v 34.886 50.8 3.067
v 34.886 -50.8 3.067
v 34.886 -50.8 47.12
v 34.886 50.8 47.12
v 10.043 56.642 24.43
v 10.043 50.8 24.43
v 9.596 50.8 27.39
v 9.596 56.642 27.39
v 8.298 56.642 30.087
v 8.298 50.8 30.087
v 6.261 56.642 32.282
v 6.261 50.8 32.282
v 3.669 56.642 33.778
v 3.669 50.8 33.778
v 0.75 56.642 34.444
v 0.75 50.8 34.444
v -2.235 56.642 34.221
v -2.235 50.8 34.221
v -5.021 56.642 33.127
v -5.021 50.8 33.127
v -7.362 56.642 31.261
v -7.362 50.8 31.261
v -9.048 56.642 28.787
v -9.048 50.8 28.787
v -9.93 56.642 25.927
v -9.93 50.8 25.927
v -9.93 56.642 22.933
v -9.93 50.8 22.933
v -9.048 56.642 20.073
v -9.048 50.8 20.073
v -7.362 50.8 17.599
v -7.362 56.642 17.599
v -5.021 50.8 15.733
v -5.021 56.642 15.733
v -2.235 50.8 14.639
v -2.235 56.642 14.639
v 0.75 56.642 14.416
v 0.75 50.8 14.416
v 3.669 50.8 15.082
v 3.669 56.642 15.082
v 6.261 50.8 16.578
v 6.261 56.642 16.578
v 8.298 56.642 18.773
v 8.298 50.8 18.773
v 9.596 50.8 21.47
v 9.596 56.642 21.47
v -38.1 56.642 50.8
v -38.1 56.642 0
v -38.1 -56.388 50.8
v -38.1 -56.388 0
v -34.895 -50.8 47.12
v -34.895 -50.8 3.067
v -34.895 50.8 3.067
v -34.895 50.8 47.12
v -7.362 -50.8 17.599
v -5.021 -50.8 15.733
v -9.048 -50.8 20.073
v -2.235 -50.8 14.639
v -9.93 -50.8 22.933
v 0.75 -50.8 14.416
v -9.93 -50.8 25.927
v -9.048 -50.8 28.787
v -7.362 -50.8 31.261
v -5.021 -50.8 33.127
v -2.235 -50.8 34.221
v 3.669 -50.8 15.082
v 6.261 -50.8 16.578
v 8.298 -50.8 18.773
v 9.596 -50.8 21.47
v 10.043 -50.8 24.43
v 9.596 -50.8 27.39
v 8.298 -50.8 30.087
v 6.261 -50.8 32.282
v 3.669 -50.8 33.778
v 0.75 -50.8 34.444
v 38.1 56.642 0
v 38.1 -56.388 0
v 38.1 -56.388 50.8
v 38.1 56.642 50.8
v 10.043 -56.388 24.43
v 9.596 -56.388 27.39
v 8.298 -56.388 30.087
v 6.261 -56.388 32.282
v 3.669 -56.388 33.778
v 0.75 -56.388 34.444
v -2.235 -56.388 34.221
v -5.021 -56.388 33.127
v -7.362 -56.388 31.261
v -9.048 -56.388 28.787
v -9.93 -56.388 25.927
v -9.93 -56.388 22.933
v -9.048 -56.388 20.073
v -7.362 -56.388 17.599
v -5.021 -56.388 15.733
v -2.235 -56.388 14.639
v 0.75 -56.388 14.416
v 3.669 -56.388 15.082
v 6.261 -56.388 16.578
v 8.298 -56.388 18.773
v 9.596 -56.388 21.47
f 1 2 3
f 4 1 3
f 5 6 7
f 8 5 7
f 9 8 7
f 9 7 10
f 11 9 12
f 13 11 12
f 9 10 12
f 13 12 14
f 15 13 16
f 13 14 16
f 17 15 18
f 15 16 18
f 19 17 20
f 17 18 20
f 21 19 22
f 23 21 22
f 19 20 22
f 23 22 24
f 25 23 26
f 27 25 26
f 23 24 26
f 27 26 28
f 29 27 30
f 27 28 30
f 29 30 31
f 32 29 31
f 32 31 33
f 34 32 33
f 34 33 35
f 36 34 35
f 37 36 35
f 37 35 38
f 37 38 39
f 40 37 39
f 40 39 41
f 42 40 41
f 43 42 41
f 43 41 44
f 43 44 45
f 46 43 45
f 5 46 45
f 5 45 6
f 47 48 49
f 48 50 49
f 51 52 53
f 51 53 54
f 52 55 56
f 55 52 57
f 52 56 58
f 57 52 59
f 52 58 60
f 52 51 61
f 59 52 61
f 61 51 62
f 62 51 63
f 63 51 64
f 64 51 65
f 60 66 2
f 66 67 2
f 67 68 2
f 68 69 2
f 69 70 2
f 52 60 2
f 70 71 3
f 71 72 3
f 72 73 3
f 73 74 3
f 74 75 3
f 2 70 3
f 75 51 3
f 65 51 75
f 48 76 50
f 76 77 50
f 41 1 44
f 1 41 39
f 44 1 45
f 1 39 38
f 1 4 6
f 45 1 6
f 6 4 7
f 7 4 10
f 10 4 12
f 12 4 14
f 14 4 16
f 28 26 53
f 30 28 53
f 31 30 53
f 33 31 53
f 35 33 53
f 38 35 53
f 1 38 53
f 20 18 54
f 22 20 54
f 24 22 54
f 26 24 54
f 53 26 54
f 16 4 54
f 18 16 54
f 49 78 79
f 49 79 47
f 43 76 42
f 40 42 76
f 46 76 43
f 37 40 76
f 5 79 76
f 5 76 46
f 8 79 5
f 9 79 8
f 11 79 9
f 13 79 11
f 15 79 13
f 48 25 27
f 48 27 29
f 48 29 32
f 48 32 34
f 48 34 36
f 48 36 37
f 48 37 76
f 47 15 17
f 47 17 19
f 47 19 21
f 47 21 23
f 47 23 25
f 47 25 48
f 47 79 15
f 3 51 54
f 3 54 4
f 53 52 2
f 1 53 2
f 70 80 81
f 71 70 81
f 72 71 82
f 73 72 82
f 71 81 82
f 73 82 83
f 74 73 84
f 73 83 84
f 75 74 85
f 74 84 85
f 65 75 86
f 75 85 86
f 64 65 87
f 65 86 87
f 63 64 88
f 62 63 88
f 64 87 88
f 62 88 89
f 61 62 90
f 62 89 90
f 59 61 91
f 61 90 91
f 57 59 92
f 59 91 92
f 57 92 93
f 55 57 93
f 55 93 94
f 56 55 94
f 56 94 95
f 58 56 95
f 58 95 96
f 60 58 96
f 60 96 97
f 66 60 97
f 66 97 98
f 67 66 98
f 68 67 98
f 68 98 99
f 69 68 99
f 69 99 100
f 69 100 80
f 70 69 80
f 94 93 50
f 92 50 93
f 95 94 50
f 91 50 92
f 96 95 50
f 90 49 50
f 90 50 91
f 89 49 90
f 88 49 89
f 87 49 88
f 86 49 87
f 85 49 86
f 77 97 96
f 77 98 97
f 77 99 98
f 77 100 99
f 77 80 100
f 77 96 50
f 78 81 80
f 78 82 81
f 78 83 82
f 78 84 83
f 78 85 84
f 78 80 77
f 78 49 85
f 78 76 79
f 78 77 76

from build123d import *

# Parameters (mm, degrees)
F0_W     = 76.2
F0_H     = 101.6
F1_DEPTH = 50.8
F2_W     = 69.7807297111
F2_H     = 44.052880723
F3_DEPTH = 159.766
F4_W     = 76.2
F4_H     = 50.8
F5_DEPTH = 5.588
F6_W     = 76.2
F6_H     = 50.8
F7_DEPTH = 5.842
F8_R     = 10.042531578
F9_DEPTH = 166.116


with BuildPart() as f1:
    # F0 (on Top) → F1 (new body)
    with BuildSketch(Plane.XY):
        Rectangle(F0_W, F0_H)
    extrude(amount=F1_DEPTH)

    # F2 (on face) → F3 (cut)
    with BuildSketch(Plane.XZ.offset(50.8)):
        with Locations((-0.0047236681, 25.0930653419)):
            Rectangle(F2_W, F2_H)
    extrude(amount=-F3_DEPTH, mode=Mode.SUBTRACT)

    # F4 (on face) → F5 (join)
    with BuildSketch(Plane.XZ.offset(50.8)):
        with Locations((0, 25.4)):
            Rectangle(F4_W, F4_H)
    extrude(amount=F5_DEPTH)

    # F6 (on face) → F7 (join)
    with BuildSketch(Plane(origin=(0, 50.8, 0), x_dir=(-1, 0, 0), z_dir=(0, 1, 0))):
        with Locations((0, 25.4)):
            Rectangle(F6_W, F6_H)
    extrude(amount=F7_DEPTH)

    # F8 (on face) → F9 (cut)
    with BuildSketch(Plane.XZ.offset(56.388)):
        with Locations((0, 24.429988116)):
            Circle(F8_R)
    extrude(amount=-F9_DEPTH, mode=Mode.SUBTRACT)


solid = f1.part
